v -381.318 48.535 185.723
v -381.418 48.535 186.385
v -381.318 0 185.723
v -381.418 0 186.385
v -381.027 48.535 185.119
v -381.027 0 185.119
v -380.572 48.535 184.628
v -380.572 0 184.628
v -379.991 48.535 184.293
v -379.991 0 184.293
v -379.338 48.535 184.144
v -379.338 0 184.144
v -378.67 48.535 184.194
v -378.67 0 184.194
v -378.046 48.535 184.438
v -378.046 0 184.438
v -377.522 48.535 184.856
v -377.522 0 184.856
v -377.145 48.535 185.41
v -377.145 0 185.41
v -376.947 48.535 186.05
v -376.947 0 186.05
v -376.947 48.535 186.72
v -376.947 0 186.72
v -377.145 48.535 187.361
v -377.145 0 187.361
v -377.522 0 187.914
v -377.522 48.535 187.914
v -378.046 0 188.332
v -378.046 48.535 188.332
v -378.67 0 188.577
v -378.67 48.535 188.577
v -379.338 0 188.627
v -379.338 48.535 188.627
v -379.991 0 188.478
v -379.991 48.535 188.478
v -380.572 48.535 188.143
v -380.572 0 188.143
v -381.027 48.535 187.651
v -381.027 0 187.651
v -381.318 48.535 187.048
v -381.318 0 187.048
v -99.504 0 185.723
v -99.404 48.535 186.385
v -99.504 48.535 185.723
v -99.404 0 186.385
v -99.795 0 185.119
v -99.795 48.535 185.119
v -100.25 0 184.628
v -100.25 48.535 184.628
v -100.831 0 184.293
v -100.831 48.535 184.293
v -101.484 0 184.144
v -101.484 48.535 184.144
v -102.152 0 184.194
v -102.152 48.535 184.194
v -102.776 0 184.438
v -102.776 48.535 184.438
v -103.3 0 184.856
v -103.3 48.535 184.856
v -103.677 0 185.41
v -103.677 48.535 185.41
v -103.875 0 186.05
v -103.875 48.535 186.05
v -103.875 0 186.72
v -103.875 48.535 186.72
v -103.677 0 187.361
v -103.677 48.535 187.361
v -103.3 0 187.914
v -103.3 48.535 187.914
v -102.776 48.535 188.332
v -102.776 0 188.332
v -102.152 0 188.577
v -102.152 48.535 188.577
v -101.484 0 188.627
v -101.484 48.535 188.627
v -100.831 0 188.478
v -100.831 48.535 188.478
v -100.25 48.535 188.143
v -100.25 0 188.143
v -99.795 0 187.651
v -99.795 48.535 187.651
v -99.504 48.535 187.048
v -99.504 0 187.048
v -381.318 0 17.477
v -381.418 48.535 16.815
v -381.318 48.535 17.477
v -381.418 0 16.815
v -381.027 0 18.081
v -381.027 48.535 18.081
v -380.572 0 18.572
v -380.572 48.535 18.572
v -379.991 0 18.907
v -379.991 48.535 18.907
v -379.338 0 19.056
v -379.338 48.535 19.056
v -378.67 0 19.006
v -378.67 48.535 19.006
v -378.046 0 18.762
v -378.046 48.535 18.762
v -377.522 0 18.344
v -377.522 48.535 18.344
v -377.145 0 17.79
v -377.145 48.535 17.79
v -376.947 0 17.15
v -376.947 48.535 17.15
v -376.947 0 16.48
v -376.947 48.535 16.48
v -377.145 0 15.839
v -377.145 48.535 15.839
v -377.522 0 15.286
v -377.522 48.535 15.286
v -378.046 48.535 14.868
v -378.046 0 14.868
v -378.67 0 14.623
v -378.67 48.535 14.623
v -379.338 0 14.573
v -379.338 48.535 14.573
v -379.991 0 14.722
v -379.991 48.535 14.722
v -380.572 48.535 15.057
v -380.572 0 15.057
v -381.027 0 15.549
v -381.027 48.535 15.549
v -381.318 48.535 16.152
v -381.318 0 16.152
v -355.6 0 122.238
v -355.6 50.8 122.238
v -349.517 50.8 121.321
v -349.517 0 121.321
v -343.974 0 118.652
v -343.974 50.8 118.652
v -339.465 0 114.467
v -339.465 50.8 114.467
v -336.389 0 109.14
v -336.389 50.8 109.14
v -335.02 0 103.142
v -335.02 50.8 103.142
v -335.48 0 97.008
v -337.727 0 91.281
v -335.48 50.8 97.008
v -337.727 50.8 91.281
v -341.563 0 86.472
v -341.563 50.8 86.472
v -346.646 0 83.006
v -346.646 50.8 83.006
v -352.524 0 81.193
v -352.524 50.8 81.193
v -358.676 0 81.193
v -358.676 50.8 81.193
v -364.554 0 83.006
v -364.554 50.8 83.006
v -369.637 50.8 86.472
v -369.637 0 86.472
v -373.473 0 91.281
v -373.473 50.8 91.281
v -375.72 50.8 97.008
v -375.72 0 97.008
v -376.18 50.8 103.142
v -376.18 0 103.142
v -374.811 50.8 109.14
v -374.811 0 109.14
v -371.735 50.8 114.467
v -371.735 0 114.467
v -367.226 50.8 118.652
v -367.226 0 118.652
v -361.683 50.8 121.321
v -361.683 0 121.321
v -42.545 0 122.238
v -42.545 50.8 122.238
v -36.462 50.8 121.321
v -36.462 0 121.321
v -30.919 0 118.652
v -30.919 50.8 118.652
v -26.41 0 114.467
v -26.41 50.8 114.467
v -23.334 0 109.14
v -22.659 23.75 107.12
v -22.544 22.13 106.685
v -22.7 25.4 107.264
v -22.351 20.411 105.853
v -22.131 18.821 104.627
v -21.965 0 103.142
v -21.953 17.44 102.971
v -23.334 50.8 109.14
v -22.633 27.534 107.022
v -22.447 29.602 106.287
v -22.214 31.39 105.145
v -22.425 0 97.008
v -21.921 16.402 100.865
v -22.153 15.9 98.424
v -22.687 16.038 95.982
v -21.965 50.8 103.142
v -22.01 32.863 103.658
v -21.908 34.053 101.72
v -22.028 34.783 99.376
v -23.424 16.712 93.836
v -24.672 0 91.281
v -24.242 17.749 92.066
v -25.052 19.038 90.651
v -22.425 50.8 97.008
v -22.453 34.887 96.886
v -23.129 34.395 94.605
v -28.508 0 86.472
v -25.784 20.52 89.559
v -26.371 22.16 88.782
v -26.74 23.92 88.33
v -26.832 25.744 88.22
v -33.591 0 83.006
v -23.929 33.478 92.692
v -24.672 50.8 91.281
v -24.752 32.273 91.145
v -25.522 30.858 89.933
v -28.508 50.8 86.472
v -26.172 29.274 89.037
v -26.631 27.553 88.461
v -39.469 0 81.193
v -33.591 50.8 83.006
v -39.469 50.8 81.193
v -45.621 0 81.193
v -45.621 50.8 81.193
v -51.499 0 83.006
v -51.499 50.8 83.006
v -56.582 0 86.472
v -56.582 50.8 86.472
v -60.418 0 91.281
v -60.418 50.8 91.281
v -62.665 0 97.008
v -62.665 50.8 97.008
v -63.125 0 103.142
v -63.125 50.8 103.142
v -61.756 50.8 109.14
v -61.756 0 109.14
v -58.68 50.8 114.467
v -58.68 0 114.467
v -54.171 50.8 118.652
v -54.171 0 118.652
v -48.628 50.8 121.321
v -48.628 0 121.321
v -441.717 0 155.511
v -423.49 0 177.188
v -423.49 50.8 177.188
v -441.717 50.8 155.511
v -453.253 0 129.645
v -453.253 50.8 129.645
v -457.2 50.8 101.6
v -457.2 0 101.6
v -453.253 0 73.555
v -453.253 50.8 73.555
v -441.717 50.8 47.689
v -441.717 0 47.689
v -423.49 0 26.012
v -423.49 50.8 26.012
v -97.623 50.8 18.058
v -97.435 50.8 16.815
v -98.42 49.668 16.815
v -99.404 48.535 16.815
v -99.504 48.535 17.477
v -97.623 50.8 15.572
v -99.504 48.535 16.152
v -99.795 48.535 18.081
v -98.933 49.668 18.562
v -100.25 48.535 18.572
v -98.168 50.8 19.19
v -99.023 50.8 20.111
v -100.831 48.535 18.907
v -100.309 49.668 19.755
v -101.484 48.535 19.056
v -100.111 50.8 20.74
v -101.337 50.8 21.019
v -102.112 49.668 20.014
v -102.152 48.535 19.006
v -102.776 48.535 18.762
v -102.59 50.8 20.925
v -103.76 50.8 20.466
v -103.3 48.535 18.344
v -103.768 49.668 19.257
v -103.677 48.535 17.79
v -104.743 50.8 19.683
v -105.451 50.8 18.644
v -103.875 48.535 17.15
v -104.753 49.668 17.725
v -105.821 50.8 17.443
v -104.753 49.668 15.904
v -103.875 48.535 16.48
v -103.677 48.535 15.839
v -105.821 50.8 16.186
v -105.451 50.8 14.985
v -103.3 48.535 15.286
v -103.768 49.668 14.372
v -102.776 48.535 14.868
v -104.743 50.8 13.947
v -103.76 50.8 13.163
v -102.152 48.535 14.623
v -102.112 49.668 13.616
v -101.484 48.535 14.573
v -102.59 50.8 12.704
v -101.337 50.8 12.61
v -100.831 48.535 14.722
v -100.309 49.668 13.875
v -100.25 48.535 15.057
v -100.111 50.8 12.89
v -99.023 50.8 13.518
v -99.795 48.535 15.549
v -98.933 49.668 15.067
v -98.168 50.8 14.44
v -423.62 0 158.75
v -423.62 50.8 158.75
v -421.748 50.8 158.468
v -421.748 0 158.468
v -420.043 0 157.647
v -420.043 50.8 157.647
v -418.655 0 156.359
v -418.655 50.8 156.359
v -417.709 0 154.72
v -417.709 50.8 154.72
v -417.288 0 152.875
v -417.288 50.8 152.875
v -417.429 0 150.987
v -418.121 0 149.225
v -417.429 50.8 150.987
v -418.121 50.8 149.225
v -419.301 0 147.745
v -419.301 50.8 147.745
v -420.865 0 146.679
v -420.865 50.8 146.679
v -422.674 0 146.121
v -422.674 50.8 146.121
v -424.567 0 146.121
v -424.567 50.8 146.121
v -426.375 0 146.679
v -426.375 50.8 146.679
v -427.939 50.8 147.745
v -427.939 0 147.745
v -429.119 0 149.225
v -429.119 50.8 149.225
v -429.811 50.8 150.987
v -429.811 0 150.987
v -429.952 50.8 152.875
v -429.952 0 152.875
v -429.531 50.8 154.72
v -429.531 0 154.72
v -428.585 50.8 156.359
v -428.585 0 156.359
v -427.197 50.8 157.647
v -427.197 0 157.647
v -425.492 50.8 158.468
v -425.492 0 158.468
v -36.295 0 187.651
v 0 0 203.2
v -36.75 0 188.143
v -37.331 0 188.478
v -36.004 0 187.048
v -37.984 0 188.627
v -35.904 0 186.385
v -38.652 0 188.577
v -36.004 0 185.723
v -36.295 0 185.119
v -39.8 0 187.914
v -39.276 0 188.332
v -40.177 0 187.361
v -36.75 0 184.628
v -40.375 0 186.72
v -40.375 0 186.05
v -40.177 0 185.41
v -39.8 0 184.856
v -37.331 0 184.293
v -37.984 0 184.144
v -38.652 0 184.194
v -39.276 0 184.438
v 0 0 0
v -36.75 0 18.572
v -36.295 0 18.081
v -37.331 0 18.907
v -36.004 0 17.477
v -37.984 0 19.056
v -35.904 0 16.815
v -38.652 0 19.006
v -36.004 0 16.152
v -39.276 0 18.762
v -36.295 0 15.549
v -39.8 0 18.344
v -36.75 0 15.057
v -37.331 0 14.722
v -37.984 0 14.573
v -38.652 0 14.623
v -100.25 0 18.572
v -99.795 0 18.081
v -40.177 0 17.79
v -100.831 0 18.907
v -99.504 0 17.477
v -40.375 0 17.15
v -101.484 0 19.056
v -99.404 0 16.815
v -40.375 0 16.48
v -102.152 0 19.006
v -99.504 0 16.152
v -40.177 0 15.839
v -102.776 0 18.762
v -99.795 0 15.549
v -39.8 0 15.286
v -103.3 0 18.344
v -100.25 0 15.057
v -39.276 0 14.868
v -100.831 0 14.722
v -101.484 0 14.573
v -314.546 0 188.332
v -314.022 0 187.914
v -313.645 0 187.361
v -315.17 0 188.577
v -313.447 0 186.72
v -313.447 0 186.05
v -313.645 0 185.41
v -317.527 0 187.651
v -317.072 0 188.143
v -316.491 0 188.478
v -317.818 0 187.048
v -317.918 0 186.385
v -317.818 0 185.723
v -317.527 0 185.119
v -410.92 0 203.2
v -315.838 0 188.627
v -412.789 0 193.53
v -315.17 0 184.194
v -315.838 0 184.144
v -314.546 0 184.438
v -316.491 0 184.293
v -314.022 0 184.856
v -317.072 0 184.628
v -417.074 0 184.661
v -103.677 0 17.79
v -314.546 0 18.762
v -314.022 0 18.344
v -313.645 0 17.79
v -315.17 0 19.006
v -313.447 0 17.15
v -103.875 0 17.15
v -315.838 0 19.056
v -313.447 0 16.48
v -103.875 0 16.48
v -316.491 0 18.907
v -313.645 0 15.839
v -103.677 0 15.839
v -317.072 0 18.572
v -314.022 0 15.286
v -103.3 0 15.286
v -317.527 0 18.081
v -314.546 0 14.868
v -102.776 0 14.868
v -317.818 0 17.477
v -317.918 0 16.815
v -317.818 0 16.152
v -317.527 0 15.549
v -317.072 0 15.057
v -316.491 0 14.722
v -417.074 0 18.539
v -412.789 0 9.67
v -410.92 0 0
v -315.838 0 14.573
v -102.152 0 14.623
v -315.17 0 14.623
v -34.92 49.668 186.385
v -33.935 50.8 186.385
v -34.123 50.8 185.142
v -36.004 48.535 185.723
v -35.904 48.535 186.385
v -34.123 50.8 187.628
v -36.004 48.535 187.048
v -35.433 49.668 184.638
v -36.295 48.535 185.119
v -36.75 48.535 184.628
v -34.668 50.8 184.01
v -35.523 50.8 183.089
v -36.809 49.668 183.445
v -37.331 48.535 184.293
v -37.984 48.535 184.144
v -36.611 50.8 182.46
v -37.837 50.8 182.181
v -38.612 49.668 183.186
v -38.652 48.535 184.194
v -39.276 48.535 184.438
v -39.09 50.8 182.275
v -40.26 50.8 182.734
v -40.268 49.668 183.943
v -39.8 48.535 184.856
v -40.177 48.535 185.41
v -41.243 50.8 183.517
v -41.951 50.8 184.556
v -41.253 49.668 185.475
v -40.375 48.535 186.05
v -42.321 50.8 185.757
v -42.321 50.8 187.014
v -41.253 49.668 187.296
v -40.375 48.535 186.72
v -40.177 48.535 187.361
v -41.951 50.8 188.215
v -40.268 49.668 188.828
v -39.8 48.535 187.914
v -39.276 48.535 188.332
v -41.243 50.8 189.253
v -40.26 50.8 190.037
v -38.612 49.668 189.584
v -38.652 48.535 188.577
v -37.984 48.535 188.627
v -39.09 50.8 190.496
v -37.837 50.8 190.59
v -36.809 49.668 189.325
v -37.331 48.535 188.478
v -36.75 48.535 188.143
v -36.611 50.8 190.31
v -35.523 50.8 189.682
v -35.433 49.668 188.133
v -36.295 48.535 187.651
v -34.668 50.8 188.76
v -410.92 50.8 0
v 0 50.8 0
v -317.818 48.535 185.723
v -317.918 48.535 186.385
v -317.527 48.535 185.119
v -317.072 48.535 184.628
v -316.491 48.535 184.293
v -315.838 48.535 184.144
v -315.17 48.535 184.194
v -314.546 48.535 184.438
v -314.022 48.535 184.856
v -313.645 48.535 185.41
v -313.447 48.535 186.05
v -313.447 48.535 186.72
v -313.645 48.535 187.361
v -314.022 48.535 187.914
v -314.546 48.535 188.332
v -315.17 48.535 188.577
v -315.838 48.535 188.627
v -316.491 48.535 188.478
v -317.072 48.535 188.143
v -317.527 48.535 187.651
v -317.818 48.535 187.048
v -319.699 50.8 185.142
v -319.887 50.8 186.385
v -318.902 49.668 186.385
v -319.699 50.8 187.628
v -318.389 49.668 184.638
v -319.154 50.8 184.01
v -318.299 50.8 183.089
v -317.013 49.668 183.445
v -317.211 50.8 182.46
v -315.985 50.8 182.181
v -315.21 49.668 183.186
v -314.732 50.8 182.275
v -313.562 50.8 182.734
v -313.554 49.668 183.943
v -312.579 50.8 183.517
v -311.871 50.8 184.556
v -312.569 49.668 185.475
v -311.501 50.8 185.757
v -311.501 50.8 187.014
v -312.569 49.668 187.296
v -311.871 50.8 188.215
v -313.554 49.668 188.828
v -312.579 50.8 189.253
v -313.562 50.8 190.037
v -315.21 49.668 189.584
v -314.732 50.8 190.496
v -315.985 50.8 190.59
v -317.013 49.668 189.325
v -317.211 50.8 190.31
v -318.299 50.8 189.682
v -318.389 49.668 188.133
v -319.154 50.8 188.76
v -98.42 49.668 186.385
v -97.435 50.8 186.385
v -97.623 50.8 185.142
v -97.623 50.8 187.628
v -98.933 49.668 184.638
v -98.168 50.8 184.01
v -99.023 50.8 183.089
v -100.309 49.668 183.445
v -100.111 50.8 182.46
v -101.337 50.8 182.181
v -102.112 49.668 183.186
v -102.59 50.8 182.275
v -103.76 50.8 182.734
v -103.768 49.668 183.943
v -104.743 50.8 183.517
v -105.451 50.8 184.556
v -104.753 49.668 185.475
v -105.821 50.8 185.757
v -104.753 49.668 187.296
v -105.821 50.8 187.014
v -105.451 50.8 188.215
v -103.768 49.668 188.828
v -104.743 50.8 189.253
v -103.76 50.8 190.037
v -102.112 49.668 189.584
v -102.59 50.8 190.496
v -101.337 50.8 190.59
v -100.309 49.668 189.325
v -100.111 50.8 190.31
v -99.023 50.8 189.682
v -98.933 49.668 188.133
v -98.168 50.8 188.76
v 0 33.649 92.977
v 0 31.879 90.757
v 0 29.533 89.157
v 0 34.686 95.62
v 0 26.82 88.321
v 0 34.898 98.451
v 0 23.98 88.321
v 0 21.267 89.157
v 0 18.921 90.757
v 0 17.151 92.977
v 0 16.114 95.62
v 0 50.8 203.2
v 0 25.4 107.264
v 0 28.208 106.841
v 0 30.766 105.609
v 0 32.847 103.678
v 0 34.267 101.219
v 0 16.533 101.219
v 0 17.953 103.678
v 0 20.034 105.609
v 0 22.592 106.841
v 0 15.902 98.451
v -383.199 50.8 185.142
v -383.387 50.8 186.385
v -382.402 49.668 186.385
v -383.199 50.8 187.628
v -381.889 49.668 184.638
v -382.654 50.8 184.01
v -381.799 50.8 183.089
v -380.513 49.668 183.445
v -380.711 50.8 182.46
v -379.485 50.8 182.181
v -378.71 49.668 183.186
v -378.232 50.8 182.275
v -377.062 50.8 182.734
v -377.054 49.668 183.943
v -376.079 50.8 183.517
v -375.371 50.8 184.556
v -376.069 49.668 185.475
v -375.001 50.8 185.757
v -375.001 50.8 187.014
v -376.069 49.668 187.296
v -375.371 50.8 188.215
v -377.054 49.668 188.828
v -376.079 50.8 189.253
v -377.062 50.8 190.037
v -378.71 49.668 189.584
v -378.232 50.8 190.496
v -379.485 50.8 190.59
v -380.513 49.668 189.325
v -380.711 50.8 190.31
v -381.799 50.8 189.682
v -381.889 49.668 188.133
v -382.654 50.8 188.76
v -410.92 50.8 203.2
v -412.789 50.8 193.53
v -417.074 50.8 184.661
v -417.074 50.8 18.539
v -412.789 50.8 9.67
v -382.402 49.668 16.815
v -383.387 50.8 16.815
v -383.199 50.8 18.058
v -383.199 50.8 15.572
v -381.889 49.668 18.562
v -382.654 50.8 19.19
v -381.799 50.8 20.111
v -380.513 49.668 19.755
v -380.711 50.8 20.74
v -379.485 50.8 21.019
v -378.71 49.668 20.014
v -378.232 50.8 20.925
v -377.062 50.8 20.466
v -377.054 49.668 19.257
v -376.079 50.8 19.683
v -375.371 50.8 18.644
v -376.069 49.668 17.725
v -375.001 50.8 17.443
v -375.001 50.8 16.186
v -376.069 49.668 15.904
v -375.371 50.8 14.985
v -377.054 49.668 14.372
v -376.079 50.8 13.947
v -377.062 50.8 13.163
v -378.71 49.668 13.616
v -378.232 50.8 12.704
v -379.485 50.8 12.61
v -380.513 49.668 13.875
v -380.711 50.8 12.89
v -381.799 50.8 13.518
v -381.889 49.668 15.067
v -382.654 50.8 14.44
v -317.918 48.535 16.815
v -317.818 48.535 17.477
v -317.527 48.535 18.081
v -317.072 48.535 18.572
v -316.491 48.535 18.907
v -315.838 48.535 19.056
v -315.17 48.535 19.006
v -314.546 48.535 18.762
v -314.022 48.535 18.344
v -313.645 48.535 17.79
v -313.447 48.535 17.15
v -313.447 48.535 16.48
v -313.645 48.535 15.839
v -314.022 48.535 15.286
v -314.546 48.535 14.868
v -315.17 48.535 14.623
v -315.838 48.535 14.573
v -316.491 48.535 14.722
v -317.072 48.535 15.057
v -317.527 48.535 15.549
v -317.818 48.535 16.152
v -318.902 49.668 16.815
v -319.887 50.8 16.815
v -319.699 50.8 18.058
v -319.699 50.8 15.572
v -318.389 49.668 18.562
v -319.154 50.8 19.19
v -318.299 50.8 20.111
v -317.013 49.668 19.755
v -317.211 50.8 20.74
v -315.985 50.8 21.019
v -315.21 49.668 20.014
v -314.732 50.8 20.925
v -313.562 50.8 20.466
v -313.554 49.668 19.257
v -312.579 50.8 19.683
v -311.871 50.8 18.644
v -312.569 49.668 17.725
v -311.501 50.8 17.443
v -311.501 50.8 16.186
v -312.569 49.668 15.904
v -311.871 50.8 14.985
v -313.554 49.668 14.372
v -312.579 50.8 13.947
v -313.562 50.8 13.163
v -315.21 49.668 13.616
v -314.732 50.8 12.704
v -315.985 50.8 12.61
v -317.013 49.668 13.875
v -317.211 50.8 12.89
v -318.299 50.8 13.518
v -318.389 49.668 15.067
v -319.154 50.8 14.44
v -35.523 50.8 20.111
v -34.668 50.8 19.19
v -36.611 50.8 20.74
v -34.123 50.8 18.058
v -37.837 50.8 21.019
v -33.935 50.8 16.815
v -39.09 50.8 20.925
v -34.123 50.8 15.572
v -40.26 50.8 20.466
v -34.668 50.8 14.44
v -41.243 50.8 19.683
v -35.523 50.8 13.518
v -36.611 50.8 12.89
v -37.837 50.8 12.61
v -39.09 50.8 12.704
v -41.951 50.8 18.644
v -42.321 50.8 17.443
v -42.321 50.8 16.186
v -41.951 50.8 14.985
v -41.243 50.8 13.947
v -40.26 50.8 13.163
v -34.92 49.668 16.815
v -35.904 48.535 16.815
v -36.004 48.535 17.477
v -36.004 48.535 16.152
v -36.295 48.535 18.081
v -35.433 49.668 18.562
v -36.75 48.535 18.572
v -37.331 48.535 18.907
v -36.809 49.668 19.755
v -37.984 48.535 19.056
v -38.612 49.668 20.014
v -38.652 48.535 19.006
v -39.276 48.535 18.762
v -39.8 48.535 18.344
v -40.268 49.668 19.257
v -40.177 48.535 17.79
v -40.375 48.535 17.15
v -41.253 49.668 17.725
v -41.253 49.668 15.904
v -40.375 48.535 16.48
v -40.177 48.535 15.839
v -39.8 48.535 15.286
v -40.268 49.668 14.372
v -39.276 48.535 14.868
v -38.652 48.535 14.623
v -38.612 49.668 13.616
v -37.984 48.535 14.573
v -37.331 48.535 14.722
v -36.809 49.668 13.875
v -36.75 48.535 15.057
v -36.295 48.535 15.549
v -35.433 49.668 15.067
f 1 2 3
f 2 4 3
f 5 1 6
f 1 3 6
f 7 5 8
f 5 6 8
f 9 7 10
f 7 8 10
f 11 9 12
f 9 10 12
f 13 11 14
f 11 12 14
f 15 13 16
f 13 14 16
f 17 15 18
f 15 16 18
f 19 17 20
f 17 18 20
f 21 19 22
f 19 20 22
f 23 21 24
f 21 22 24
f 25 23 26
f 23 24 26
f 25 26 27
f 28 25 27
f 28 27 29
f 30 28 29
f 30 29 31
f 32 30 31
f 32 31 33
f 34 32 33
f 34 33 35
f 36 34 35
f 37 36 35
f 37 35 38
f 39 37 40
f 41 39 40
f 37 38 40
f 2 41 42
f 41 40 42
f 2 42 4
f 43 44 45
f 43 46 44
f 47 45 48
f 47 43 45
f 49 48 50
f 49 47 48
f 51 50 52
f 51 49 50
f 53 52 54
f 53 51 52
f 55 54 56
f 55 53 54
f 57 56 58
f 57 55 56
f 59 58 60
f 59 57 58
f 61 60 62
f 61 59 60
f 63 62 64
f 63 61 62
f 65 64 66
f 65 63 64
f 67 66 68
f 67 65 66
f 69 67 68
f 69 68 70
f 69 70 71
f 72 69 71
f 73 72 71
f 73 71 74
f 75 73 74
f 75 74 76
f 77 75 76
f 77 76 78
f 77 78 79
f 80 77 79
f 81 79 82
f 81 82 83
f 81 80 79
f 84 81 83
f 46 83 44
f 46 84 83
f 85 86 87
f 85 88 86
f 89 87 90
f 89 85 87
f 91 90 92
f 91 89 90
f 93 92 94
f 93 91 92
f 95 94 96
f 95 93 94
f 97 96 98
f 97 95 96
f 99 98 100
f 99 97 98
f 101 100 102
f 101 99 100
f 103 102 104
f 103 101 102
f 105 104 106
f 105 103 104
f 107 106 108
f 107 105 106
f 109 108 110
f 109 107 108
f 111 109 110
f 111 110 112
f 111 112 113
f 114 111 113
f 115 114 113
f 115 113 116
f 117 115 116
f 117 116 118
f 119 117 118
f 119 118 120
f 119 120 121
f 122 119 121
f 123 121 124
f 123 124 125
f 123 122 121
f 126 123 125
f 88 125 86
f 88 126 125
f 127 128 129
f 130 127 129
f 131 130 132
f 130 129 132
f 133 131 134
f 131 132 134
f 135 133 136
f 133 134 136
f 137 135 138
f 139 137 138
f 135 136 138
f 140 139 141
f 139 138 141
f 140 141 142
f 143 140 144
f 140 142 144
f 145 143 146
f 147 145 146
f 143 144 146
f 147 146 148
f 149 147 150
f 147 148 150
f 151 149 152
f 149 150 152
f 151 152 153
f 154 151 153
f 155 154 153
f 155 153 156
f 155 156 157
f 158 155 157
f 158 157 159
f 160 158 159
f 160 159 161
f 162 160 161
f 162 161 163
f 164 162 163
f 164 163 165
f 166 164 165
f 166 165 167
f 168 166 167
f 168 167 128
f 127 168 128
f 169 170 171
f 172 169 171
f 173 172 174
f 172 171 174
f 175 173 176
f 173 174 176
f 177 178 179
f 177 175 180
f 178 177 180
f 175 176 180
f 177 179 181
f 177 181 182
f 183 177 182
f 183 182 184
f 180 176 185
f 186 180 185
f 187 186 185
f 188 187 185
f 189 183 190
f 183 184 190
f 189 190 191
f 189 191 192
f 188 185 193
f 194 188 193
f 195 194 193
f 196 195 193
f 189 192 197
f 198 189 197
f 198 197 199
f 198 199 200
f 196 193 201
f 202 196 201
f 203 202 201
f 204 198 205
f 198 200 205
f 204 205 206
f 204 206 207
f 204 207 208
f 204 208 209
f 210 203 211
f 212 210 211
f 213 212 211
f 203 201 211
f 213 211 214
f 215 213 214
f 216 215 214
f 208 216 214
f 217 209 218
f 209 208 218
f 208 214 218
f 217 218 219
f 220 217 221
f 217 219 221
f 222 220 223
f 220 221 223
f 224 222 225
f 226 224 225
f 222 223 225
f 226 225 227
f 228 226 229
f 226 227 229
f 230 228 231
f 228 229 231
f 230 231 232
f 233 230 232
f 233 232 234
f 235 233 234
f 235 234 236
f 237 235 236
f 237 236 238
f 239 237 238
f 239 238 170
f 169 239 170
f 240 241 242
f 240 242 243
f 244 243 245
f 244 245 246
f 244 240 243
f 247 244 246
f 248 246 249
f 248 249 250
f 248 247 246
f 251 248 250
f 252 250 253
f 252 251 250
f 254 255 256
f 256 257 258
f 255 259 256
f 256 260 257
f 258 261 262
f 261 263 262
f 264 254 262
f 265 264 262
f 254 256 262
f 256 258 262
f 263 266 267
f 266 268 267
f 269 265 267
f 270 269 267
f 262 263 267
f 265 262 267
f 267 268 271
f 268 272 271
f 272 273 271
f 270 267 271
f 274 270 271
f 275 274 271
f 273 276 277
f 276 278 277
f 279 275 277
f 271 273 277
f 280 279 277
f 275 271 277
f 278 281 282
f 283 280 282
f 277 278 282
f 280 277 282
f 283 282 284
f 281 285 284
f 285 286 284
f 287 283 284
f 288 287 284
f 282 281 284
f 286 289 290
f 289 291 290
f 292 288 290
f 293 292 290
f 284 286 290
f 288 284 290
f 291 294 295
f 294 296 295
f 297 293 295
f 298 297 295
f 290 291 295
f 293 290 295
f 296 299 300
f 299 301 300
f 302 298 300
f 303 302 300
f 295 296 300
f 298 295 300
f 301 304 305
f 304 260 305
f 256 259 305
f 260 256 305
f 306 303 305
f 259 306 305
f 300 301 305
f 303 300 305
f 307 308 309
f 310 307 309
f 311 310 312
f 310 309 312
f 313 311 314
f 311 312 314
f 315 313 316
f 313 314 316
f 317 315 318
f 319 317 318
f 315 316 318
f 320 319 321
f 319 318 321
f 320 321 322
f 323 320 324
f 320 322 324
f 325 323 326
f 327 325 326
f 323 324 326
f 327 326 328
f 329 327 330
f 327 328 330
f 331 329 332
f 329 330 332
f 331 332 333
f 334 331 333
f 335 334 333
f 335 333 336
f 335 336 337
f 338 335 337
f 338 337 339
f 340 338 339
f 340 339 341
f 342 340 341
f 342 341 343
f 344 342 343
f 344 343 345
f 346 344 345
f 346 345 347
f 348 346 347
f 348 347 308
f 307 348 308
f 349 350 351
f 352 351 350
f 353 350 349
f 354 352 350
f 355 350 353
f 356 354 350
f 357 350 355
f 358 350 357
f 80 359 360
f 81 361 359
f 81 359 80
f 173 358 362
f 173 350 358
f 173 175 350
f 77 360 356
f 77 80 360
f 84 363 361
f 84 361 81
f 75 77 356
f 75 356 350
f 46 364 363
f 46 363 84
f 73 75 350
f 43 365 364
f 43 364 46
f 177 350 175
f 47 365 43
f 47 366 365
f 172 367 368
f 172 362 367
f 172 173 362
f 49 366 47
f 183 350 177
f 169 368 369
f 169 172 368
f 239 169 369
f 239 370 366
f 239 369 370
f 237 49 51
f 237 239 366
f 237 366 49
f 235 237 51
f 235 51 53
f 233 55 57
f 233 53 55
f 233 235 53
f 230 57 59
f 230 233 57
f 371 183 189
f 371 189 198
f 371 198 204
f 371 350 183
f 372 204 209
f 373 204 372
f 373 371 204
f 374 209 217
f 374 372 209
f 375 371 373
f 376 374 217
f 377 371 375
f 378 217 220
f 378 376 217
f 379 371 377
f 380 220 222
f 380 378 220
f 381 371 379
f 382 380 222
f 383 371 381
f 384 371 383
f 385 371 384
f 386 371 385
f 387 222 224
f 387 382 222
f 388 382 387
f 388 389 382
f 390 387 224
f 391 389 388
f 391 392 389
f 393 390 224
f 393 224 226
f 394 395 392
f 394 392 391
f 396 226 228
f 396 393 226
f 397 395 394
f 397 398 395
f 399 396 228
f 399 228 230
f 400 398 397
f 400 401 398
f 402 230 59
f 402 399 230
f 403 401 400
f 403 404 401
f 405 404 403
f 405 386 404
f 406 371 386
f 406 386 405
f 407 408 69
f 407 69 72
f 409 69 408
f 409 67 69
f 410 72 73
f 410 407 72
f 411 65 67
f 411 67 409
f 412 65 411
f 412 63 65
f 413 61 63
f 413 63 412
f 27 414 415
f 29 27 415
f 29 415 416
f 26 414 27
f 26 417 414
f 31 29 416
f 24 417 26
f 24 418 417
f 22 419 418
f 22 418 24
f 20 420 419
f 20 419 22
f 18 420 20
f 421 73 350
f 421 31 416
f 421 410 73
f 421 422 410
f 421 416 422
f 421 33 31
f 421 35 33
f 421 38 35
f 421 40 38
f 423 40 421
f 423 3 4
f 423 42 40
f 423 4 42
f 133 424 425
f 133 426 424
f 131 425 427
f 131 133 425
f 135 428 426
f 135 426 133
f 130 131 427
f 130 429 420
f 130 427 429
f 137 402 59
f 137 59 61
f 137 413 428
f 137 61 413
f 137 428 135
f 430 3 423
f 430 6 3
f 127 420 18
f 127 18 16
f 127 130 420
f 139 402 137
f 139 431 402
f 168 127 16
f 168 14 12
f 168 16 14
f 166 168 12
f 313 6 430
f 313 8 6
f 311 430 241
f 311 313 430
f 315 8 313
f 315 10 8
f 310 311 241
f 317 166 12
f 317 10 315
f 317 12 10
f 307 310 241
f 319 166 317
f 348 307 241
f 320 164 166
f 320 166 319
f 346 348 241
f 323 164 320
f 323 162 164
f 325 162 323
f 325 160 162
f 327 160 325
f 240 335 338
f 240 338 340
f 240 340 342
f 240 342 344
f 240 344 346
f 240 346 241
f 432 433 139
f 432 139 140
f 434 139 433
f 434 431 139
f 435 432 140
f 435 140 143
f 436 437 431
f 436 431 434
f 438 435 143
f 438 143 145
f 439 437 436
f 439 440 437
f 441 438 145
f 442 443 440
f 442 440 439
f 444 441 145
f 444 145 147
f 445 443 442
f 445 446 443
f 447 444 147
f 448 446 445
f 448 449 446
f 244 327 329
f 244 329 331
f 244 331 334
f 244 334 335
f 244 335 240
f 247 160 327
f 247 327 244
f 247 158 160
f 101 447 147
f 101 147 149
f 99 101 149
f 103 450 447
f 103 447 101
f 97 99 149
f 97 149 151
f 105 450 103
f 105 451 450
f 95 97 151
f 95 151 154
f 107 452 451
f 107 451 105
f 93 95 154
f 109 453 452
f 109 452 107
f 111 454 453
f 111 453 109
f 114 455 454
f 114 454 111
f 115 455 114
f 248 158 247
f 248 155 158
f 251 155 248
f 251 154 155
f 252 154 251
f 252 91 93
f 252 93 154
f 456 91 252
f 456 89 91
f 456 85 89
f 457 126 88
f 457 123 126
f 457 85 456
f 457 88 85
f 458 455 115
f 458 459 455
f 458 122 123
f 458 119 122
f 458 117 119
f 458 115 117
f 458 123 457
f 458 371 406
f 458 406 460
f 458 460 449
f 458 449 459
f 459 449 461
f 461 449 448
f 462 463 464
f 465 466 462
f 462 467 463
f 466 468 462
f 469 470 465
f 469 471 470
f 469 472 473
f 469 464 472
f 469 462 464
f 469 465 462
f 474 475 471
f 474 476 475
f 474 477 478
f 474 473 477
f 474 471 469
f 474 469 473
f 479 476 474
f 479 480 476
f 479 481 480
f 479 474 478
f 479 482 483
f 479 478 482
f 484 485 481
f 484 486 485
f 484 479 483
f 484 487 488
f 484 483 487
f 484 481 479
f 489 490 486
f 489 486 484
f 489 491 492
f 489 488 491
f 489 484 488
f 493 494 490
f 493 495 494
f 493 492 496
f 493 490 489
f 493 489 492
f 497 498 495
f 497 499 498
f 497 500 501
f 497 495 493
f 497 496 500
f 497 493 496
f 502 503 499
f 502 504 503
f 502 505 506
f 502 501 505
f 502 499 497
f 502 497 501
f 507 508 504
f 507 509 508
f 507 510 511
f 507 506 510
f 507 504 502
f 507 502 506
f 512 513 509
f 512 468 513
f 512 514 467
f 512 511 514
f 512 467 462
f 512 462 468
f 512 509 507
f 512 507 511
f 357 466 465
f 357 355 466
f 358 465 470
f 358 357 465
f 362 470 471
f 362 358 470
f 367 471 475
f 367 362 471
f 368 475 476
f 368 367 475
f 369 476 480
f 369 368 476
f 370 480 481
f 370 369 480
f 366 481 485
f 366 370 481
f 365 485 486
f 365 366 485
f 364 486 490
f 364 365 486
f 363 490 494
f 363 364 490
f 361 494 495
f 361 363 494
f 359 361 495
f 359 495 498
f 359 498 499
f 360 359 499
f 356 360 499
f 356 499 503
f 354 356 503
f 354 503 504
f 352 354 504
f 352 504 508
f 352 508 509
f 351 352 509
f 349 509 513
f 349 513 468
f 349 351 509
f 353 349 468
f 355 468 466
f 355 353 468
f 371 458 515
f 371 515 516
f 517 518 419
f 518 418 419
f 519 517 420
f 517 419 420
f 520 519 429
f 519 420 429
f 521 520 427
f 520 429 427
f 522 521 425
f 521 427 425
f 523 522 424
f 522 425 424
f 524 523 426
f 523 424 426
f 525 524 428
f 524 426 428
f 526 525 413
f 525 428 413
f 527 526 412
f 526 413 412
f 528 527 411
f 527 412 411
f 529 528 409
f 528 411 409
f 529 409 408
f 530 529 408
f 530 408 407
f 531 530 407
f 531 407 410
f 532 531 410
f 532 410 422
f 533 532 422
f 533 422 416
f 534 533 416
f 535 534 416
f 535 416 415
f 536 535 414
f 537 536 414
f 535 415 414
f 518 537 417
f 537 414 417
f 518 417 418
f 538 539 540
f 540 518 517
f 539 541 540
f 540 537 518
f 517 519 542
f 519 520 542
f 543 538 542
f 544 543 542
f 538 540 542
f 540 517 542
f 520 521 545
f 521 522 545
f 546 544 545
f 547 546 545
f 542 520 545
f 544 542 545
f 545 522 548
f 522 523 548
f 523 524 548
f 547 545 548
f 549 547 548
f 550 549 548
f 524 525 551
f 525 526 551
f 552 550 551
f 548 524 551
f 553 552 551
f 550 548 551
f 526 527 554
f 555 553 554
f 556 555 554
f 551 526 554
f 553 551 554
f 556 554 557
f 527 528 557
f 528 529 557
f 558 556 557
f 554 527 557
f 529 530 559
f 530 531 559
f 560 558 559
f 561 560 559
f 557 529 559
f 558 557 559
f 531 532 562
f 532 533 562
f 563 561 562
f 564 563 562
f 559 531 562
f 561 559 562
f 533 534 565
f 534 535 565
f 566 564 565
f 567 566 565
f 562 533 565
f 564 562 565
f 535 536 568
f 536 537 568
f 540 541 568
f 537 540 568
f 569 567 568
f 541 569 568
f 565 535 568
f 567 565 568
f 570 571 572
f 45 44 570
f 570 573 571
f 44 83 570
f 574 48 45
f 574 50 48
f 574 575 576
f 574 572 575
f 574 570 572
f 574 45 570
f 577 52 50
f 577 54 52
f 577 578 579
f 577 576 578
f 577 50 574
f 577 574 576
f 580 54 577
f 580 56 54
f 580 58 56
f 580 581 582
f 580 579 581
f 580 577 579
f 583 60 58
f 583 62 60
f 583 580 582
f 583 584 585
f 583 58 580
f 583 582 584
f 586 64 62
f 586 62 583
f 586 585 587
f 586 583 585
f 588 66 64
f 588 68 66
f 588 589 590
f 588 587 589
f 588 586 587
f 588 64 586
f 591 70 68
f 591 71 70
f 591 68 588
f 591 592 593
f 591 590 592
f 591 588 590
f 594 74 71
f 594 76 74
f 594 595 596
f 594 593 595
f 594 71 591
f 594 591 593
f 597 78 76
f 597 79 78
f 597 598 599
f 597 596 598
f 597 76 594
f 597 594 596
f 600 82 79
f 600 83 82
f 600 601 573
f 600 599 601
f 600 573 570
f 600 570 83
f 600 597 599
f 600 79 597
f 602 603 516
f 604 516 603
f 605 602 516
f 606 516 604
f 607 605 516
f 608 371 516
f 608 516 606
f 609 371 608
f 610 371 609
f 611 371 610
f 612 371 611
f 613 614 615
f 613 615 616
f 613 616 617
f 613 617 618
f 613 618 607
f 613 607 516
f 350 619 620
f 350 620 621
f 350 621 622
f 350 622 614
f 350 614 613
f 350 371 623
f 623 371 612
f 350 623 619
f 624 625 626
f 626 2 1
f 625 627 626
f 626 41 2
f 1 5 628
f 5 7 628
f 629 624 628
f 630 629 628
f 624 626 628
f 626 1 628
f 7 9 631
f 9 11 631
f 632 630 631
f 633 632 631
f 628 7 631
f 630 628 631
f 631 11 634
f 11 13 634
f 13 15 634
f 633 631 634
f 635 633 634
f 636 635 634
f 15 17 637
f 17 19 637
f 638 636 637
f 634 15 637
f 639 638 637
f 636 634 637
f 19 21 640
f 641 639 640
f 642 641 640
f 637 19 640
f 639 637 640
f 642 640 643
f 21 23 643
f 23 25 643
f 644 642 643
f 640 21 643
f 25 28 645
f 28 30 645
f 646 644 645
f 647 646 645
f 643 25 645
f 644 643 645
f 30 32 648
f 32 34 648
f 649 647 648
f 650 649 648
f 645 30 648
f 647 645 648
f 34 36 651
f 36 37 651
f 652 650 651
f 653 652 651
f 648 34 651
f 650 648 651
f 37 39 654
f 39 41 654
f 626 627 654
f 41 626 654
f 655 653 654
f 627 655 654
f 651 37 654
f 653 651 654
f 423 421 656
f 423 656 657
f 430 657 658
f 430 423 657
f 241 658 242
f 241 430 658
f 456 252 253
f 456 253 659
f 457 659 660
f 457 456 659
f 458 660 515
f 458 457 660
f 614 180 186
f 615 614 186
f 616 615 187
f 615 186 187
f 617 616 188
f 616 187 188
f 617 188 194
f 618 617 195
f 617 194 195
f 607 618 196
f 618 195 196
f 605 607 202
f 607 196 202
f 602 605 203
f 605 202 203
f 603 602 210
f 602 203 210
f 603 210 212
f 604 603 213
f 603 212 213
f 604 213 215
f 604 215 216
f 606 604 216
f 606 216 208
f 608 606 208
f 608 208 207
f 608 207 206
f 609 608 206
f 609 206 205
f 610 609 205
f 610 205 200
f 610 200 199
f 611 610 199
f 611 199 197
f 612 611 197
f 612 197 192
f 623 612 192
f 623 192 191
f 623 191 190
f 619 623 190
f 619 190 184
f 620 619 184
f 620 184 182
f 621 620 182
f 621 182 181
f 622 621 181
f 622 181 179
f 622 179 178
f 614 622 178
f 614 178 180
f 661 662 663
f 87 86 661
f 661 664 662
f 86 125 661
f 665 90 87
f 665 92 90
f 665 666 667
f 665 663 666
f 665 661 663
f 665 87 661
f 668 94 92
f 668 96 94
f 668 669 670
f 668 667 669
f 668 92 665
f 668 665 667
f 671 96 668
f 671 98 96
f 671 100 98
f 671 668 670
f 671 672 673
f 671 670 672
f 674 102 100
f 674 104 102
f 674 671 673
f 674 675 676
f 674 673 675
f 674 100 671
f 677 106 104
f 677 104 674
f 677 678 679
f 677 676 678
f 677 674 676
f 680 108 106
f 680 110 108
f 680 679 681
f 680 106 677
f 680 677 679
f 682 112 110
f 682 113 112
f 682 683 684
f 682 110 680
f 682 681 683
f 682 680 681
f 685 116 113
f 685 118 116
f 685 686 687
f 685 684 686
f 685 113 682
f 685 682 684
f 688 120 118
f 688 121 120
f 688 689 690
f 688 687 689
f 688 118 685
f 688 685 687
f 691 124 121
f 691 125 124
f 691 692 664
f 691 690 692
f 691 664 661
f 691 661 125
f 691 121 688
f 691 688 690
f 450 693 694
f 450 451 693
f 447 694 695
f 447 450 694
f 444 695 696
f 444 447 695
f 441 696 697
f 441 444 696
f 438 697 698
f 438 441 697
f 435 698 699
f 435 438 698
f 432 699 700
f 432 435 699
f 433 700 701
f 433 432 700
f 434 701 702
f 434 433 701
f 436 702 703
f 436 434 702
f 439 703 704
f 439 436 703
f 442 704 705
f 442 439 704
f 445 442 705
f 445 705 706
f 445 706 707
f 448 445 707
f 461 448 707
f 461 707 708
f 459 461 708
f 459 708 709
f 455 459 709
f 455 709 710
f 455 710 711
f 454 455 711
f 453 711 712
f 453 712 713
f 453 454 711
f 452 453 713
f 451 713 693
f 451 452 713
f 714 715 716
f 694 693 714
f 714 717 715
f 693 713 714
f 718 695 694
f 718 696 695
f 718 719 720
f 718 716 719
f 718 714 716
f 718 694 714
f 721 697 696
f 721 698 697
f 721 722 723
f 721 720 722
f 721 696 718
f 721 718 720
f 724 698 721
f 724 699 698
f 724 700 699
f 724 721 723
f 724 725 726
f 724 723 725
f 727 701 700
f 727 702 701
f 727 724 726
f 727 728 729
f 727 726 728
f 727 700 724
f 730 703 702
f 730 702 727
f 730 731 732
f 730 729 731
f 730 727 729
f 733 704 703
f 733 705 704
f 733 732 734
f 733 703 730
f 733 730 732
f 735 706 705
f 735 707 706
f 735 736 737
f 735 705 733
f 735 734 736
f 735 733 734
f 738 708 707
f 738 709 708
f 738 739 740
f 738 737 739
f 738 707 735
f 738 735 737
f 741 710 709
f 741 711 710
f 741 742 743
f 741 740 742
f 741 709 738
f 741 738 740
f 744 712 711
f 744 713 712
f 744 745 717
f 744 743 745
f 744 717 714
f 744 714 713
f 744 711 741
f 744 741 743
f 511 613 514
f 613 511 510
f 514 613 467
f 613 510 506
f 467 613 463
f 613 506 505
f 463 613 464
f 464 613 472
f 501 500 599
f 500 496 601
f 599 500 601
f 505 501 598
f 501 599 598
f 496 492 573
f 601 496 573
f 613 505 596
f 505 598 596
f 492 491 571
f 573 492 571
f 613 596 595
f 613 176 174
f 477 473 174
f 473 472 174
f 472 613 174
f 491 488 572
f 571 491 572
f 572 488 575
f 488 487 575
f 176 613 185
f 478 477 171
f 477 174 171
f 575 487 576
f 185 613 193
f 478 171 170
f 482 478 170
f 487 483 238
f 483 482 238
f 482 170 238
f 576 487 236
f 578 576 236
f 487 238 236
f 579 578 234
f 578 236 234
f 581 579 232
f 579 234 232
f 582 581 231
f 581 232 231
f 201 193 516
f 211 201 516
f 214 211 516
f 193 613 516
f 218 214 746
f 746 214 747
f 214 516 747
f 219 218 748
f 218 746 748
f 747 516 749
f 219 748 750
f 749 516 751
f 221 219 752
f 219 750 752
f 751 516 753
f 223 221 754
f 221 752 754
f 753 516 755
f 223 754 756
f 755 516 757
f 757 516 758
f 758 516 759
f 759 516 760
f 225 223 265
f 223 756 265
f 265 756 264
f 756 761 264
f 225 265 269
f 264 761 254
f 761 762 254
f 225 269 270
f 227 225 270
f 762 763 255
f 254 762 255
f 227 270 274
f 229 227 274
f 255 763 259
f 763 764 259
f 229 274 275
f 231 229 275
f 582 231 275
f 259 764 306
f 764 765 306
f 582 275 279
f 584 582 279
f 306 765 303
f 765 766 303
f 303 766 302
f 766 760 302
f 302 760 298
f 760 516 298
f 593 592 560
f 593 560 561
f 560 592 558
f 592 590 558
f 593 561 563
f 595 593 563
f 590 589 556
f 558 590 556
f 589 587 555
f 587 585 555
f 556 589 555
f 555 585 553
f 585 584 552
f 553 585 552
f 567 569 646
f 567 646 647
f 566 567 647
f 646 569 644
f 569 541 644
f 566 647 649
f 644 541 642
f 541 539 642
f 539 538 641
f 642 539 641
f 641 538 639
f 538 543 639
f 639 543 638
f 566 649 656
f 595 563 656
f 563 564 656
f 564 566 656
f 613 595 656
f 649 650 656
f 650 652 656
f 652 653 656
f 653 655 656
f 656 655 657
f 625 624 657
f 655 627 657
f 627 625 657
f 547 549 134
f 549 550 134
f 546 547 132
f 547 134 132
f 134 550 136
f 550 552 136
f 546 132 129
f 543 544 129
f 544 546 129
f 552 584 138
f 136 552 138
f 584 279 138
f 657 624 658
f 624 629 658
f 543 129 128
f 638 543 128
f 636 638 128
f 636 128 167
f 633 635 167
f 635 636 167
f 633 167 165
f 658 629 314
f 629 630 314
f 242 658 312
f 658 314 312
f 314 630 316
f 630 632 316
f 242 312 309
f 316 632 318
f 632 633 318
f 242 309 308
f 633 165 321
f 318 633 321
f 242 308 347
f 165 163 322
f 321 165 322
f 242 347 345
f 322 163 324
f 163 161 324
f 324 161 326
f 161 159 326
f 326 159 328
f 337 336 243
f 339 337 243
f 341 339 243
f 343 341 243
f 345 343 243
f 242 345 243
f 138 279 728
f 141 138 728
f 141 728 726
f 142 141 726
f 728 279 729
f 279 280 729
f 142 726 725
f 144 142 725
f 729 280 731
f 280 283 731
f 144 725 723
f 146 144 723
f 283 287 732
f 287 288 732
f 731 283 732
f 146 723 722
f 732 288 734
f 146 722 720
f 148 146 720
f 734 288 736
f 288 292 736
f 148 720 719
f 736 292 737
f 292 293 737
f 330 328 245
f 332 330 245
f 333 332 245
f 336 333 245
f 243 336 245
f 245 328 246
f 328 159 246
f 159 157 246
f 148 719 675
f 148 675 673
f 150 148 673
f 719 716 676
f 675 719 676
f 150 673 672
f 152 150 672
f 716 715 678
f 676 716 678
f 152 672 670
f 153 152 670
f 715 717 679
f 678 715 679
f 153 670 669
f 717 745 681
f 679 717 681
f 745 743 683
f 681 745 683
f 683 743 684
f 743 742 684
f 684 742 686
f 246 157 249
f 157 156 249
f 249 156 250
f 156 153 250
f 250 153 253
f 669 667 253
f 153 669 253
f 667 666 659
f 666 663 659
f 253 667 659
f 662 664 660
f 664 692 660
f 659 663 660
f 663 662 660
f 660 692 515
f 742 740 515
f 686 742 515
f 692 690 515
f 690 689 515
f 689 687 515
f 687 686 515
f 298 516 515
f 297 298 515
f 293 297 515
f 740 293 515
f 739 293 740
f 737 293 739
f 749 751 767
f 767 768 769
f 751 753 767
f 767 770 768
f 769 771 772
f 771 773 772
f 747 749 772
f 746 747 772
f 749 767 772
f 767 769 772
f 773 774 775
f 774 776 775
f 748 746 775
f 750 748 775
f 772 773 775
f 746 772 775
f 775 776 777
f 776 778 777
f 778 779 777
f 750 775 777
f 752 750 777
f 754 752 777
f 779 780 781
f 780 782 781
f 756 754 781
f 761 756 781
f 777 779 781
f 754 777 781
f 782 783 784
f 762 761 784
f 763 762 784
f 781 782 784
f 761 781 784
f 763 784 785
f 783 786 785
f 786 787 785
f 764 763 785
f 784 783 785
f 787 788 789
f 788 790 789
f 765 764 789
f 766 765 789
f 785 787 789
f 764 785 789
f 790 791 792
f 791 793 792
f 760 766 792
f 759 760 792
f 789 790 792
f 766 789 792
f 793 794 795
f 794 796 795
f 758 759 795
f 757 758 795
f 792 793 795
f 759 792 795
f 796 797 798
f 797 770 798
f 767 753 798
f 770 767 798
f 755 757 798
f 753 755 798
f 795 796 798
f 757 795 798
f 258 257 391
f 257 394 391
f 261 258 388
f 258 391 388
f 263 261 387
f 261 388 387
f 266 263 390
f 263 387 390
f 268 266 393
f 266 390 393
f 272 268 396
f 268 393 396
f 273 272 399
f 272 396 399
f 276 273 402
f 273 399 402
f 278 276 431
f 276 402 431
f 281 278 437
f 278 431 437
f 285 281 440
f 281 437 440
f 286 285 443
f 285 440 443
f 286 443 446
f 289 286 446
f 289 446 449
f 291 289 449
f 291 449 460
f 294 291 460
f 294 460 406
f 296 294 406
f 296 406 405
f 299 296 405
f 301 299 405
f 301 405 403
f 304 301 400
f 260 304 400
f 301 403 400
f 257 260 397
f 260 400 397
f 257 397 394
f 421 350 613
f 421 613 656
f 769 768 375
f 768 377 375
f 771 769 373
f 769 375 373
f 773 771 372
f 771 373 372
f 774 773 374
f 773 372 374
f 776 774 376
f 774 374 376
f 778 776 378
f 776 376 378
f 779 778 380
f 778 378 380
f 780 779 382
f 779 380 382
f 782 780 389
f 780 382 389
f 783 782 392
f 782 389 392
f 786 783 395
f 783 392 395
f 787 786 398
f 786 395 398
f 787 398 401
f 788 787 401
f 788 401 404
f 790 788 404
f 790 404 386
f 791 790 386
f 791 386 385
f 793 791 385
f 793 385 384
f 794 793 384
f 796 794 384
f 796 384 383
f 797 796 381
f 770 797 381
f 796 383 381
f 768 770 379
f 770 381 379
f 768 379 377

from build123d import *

# Parameters (mm, degrees)
BOSS_EXTRUDE1_DEPTH                               = 50.8
CSK_FOR_8_FLAT_HEAD_MACHINE_SCREW_100_D           = 4.4958
CSK_FOR_8_FLAT_HEAD_MACHINE_SCREW_100_CSINK_D     = 8.4328
CSK_FOR_8_FLAT_HEAD_MACHINE_SCREW_100_CSINK_ANGLE = 82
MIRROR2_COPY_1_D                                  = 4.4958
MIRROR2_COPY_1_CSINK_D                            = 8.4328
MIRROR2_COPY_1_CSINK_ANGLE                        = 82
SKETCH14_R                                        = 6.35
CUT_EXTRUDE4_DEPTH                                = 503.89434278
SKETCH15_R                                        = 20.6375
CUT_EXTRUDE5_DEPTH                                = 503.89434278
SKETCH16_R                                        = 20.6375
CUT_EXTRUDE6_DEPTH                                = 503.89434278
F_5_8_0_75_DIAMETER_HOLE1_D                       = 19.05
F_5_8_0_75_DIAMETER_HOLE1_DEPTH                   = 32.961002604
F_5_8_0_75_DIAMETER_HOLE1_TIP                     = 5.723197396


with BuildPart() as part:
    # Sketch1 → Boss-Extrude1 (new body)
    with BuildSketch(Plane(origin=(0, 0, 0), x_dir=(1, 0, 0), z_dir=(0, 1, 0))):
        with BuildLine():
            Line((0, 0), (0, -203.2))
            Line((0, -203.2), (-410.920118429, -203.2))
            ThreePointArc((-410.920118429, -203.2), (-414.643880683, -188.956317144), (-423.489894398, -177.187844516))
            ThreePointArc((-423.489894398, -177.187844516), (-457.2, -101.6), (-423.489894398, -26.012155484))
            ThreePointArc((-423.489894398, -26.012155484), (-414.643880683, -14.243682856), (-410.920118429, 0))
            Line((-410.920118429, 0), (0, 0))
        make_face()
    extrude(amount=BOSS_EXTRUDE1_DEPTH)

    # CSK for #8 Flat Head Machine Screw (100)1 (through all)
    with Locations(Plane(origin=(0, 50.8, 0), x_dir=(1, 0, 0), z_dir=(0, 1, 0))):
        with Locations((-379.170118429, -186.3852), (-315.670118429, -186.3852)):
            csk_for_8_flat_head_machine_screw_100 = CounterSinkHole(CSK_FOR_8_FLAT_HEAD_MACHINE_SCREW_100_D / 2, CSK_FOR_8_FLAT_HEAD_MACHINE_SCREW_100_CSINK_D / 2, counter_sink_angle=CSK_FOR_8_FLAT_HEAD_MACHINE_SCREW_100_CSINK_ANGLE)

    # Mirror1: CSK for #8 Flat Head Machine Screw (100)1 across plane
    add(csk_for_8_flat_head_machine_screw_100.mirror(Plane.XY.offset(101.6)), mode=Mode.SUBTRACT)

    # Mirror2: CSK for #8 Flat Head Machine Screw (100)1 across plane
    add(csk_for_8_flat_head_machine_screw_100.mirror(Plane(origin=(-208.661, 0, 0), x_dir=(0, 0, 1), z_dir=(1, 0, 0))), mode=Mode.SUBTRACT)

    # Mirror2 copy 1 (through all)
    with Locations(Plane(origin=(-417.322, 50.8, 203.2), x_dir=(-1, 0, 0), z_dir=(0, 1, 0))):
        with Locations((-379.170118429, -186.3852), (-315.670118429, -186.3852)):
            CounterSinkHole(MIRROR2_COPY_1_D / 2, MIRROR2_COPY_1_CSINK_D / 2, counter_sink_angle=MIRROR2_COPY_1_CSINK_ANGLE)

    # Sketch14 → Cut-Extrude4 (cut, through all)
    with BuildSketch(Plane(origin=(0, 50.8, 0), x_dir=(1, 0, 0), z_dir=(0, 1, 0))):
        with Locations(Location((-423.620118429, -152.4, 0), (0, 0, 270))):
            Circle(SKETCH14_R)
    extrude(amount=-CUT_EXTRUDE4_DEPTH, mode=Mode.SUBTRACT)

    # Sketch15 → Cut-Extrude5 (cut, through all)
    with BuildSketch(Plane(origin=(0, 50.8, 0), x_dir=(1, 0, 0), z_dir=(0, 1, 0))):
        with Locations(Location((-355.6, -101.6, 0), (0, 0, 270))):
            Circle(SKETCH15_R)
    extrude(amount=-CUT_EXTRUDE5_DEPTH, mode=Mode.SUBTRACT)

    # Sketch16 → Cut-Extrude6 (cut, through all)
    with BuildSketch(Plane(origin=(0, 50.8, 0), x_dir=(1, 0, 0), z_dir=(0, 1, 0))):
        with Locations(Location((-42.545, -101.6, 0), (0, 0, 270))):
            Circle(SKETCH16_R)
    extrude(amount=-CUT_EXTRUDE6_DEPTH, mode=Mode.SUBTRACT)

    # 5/8 (0.75) Diameter Hole1
    with Locations(Plane(origin=(0, 0, 0), x_dir=(0, 0, -1), z_dir=(1, 0, 0))):
        with Locations((-97.7392, 25.4)):
            Hole(F_5_8_0_75_DIAMETER_HOLE1_D / 2, depth=F_5_8_0_75_DIAMETER_HOLE1_DEPTH)
            with Locations((0, 0, -(F_5_8_0_75_DIAMETER_HOLE1_DEPTH + F_5_8_0_75_DIAMETER_HOLE1_TIP / 2))):  # 118° drill point
                Cone(0, F_5_8_0_75_DIAMETER_HOLE1_D / 2, F_5_8_0_75_DIAMETER_HOLE1_TIP, mode=Mode.SUBTRACT)


solid = part.part
